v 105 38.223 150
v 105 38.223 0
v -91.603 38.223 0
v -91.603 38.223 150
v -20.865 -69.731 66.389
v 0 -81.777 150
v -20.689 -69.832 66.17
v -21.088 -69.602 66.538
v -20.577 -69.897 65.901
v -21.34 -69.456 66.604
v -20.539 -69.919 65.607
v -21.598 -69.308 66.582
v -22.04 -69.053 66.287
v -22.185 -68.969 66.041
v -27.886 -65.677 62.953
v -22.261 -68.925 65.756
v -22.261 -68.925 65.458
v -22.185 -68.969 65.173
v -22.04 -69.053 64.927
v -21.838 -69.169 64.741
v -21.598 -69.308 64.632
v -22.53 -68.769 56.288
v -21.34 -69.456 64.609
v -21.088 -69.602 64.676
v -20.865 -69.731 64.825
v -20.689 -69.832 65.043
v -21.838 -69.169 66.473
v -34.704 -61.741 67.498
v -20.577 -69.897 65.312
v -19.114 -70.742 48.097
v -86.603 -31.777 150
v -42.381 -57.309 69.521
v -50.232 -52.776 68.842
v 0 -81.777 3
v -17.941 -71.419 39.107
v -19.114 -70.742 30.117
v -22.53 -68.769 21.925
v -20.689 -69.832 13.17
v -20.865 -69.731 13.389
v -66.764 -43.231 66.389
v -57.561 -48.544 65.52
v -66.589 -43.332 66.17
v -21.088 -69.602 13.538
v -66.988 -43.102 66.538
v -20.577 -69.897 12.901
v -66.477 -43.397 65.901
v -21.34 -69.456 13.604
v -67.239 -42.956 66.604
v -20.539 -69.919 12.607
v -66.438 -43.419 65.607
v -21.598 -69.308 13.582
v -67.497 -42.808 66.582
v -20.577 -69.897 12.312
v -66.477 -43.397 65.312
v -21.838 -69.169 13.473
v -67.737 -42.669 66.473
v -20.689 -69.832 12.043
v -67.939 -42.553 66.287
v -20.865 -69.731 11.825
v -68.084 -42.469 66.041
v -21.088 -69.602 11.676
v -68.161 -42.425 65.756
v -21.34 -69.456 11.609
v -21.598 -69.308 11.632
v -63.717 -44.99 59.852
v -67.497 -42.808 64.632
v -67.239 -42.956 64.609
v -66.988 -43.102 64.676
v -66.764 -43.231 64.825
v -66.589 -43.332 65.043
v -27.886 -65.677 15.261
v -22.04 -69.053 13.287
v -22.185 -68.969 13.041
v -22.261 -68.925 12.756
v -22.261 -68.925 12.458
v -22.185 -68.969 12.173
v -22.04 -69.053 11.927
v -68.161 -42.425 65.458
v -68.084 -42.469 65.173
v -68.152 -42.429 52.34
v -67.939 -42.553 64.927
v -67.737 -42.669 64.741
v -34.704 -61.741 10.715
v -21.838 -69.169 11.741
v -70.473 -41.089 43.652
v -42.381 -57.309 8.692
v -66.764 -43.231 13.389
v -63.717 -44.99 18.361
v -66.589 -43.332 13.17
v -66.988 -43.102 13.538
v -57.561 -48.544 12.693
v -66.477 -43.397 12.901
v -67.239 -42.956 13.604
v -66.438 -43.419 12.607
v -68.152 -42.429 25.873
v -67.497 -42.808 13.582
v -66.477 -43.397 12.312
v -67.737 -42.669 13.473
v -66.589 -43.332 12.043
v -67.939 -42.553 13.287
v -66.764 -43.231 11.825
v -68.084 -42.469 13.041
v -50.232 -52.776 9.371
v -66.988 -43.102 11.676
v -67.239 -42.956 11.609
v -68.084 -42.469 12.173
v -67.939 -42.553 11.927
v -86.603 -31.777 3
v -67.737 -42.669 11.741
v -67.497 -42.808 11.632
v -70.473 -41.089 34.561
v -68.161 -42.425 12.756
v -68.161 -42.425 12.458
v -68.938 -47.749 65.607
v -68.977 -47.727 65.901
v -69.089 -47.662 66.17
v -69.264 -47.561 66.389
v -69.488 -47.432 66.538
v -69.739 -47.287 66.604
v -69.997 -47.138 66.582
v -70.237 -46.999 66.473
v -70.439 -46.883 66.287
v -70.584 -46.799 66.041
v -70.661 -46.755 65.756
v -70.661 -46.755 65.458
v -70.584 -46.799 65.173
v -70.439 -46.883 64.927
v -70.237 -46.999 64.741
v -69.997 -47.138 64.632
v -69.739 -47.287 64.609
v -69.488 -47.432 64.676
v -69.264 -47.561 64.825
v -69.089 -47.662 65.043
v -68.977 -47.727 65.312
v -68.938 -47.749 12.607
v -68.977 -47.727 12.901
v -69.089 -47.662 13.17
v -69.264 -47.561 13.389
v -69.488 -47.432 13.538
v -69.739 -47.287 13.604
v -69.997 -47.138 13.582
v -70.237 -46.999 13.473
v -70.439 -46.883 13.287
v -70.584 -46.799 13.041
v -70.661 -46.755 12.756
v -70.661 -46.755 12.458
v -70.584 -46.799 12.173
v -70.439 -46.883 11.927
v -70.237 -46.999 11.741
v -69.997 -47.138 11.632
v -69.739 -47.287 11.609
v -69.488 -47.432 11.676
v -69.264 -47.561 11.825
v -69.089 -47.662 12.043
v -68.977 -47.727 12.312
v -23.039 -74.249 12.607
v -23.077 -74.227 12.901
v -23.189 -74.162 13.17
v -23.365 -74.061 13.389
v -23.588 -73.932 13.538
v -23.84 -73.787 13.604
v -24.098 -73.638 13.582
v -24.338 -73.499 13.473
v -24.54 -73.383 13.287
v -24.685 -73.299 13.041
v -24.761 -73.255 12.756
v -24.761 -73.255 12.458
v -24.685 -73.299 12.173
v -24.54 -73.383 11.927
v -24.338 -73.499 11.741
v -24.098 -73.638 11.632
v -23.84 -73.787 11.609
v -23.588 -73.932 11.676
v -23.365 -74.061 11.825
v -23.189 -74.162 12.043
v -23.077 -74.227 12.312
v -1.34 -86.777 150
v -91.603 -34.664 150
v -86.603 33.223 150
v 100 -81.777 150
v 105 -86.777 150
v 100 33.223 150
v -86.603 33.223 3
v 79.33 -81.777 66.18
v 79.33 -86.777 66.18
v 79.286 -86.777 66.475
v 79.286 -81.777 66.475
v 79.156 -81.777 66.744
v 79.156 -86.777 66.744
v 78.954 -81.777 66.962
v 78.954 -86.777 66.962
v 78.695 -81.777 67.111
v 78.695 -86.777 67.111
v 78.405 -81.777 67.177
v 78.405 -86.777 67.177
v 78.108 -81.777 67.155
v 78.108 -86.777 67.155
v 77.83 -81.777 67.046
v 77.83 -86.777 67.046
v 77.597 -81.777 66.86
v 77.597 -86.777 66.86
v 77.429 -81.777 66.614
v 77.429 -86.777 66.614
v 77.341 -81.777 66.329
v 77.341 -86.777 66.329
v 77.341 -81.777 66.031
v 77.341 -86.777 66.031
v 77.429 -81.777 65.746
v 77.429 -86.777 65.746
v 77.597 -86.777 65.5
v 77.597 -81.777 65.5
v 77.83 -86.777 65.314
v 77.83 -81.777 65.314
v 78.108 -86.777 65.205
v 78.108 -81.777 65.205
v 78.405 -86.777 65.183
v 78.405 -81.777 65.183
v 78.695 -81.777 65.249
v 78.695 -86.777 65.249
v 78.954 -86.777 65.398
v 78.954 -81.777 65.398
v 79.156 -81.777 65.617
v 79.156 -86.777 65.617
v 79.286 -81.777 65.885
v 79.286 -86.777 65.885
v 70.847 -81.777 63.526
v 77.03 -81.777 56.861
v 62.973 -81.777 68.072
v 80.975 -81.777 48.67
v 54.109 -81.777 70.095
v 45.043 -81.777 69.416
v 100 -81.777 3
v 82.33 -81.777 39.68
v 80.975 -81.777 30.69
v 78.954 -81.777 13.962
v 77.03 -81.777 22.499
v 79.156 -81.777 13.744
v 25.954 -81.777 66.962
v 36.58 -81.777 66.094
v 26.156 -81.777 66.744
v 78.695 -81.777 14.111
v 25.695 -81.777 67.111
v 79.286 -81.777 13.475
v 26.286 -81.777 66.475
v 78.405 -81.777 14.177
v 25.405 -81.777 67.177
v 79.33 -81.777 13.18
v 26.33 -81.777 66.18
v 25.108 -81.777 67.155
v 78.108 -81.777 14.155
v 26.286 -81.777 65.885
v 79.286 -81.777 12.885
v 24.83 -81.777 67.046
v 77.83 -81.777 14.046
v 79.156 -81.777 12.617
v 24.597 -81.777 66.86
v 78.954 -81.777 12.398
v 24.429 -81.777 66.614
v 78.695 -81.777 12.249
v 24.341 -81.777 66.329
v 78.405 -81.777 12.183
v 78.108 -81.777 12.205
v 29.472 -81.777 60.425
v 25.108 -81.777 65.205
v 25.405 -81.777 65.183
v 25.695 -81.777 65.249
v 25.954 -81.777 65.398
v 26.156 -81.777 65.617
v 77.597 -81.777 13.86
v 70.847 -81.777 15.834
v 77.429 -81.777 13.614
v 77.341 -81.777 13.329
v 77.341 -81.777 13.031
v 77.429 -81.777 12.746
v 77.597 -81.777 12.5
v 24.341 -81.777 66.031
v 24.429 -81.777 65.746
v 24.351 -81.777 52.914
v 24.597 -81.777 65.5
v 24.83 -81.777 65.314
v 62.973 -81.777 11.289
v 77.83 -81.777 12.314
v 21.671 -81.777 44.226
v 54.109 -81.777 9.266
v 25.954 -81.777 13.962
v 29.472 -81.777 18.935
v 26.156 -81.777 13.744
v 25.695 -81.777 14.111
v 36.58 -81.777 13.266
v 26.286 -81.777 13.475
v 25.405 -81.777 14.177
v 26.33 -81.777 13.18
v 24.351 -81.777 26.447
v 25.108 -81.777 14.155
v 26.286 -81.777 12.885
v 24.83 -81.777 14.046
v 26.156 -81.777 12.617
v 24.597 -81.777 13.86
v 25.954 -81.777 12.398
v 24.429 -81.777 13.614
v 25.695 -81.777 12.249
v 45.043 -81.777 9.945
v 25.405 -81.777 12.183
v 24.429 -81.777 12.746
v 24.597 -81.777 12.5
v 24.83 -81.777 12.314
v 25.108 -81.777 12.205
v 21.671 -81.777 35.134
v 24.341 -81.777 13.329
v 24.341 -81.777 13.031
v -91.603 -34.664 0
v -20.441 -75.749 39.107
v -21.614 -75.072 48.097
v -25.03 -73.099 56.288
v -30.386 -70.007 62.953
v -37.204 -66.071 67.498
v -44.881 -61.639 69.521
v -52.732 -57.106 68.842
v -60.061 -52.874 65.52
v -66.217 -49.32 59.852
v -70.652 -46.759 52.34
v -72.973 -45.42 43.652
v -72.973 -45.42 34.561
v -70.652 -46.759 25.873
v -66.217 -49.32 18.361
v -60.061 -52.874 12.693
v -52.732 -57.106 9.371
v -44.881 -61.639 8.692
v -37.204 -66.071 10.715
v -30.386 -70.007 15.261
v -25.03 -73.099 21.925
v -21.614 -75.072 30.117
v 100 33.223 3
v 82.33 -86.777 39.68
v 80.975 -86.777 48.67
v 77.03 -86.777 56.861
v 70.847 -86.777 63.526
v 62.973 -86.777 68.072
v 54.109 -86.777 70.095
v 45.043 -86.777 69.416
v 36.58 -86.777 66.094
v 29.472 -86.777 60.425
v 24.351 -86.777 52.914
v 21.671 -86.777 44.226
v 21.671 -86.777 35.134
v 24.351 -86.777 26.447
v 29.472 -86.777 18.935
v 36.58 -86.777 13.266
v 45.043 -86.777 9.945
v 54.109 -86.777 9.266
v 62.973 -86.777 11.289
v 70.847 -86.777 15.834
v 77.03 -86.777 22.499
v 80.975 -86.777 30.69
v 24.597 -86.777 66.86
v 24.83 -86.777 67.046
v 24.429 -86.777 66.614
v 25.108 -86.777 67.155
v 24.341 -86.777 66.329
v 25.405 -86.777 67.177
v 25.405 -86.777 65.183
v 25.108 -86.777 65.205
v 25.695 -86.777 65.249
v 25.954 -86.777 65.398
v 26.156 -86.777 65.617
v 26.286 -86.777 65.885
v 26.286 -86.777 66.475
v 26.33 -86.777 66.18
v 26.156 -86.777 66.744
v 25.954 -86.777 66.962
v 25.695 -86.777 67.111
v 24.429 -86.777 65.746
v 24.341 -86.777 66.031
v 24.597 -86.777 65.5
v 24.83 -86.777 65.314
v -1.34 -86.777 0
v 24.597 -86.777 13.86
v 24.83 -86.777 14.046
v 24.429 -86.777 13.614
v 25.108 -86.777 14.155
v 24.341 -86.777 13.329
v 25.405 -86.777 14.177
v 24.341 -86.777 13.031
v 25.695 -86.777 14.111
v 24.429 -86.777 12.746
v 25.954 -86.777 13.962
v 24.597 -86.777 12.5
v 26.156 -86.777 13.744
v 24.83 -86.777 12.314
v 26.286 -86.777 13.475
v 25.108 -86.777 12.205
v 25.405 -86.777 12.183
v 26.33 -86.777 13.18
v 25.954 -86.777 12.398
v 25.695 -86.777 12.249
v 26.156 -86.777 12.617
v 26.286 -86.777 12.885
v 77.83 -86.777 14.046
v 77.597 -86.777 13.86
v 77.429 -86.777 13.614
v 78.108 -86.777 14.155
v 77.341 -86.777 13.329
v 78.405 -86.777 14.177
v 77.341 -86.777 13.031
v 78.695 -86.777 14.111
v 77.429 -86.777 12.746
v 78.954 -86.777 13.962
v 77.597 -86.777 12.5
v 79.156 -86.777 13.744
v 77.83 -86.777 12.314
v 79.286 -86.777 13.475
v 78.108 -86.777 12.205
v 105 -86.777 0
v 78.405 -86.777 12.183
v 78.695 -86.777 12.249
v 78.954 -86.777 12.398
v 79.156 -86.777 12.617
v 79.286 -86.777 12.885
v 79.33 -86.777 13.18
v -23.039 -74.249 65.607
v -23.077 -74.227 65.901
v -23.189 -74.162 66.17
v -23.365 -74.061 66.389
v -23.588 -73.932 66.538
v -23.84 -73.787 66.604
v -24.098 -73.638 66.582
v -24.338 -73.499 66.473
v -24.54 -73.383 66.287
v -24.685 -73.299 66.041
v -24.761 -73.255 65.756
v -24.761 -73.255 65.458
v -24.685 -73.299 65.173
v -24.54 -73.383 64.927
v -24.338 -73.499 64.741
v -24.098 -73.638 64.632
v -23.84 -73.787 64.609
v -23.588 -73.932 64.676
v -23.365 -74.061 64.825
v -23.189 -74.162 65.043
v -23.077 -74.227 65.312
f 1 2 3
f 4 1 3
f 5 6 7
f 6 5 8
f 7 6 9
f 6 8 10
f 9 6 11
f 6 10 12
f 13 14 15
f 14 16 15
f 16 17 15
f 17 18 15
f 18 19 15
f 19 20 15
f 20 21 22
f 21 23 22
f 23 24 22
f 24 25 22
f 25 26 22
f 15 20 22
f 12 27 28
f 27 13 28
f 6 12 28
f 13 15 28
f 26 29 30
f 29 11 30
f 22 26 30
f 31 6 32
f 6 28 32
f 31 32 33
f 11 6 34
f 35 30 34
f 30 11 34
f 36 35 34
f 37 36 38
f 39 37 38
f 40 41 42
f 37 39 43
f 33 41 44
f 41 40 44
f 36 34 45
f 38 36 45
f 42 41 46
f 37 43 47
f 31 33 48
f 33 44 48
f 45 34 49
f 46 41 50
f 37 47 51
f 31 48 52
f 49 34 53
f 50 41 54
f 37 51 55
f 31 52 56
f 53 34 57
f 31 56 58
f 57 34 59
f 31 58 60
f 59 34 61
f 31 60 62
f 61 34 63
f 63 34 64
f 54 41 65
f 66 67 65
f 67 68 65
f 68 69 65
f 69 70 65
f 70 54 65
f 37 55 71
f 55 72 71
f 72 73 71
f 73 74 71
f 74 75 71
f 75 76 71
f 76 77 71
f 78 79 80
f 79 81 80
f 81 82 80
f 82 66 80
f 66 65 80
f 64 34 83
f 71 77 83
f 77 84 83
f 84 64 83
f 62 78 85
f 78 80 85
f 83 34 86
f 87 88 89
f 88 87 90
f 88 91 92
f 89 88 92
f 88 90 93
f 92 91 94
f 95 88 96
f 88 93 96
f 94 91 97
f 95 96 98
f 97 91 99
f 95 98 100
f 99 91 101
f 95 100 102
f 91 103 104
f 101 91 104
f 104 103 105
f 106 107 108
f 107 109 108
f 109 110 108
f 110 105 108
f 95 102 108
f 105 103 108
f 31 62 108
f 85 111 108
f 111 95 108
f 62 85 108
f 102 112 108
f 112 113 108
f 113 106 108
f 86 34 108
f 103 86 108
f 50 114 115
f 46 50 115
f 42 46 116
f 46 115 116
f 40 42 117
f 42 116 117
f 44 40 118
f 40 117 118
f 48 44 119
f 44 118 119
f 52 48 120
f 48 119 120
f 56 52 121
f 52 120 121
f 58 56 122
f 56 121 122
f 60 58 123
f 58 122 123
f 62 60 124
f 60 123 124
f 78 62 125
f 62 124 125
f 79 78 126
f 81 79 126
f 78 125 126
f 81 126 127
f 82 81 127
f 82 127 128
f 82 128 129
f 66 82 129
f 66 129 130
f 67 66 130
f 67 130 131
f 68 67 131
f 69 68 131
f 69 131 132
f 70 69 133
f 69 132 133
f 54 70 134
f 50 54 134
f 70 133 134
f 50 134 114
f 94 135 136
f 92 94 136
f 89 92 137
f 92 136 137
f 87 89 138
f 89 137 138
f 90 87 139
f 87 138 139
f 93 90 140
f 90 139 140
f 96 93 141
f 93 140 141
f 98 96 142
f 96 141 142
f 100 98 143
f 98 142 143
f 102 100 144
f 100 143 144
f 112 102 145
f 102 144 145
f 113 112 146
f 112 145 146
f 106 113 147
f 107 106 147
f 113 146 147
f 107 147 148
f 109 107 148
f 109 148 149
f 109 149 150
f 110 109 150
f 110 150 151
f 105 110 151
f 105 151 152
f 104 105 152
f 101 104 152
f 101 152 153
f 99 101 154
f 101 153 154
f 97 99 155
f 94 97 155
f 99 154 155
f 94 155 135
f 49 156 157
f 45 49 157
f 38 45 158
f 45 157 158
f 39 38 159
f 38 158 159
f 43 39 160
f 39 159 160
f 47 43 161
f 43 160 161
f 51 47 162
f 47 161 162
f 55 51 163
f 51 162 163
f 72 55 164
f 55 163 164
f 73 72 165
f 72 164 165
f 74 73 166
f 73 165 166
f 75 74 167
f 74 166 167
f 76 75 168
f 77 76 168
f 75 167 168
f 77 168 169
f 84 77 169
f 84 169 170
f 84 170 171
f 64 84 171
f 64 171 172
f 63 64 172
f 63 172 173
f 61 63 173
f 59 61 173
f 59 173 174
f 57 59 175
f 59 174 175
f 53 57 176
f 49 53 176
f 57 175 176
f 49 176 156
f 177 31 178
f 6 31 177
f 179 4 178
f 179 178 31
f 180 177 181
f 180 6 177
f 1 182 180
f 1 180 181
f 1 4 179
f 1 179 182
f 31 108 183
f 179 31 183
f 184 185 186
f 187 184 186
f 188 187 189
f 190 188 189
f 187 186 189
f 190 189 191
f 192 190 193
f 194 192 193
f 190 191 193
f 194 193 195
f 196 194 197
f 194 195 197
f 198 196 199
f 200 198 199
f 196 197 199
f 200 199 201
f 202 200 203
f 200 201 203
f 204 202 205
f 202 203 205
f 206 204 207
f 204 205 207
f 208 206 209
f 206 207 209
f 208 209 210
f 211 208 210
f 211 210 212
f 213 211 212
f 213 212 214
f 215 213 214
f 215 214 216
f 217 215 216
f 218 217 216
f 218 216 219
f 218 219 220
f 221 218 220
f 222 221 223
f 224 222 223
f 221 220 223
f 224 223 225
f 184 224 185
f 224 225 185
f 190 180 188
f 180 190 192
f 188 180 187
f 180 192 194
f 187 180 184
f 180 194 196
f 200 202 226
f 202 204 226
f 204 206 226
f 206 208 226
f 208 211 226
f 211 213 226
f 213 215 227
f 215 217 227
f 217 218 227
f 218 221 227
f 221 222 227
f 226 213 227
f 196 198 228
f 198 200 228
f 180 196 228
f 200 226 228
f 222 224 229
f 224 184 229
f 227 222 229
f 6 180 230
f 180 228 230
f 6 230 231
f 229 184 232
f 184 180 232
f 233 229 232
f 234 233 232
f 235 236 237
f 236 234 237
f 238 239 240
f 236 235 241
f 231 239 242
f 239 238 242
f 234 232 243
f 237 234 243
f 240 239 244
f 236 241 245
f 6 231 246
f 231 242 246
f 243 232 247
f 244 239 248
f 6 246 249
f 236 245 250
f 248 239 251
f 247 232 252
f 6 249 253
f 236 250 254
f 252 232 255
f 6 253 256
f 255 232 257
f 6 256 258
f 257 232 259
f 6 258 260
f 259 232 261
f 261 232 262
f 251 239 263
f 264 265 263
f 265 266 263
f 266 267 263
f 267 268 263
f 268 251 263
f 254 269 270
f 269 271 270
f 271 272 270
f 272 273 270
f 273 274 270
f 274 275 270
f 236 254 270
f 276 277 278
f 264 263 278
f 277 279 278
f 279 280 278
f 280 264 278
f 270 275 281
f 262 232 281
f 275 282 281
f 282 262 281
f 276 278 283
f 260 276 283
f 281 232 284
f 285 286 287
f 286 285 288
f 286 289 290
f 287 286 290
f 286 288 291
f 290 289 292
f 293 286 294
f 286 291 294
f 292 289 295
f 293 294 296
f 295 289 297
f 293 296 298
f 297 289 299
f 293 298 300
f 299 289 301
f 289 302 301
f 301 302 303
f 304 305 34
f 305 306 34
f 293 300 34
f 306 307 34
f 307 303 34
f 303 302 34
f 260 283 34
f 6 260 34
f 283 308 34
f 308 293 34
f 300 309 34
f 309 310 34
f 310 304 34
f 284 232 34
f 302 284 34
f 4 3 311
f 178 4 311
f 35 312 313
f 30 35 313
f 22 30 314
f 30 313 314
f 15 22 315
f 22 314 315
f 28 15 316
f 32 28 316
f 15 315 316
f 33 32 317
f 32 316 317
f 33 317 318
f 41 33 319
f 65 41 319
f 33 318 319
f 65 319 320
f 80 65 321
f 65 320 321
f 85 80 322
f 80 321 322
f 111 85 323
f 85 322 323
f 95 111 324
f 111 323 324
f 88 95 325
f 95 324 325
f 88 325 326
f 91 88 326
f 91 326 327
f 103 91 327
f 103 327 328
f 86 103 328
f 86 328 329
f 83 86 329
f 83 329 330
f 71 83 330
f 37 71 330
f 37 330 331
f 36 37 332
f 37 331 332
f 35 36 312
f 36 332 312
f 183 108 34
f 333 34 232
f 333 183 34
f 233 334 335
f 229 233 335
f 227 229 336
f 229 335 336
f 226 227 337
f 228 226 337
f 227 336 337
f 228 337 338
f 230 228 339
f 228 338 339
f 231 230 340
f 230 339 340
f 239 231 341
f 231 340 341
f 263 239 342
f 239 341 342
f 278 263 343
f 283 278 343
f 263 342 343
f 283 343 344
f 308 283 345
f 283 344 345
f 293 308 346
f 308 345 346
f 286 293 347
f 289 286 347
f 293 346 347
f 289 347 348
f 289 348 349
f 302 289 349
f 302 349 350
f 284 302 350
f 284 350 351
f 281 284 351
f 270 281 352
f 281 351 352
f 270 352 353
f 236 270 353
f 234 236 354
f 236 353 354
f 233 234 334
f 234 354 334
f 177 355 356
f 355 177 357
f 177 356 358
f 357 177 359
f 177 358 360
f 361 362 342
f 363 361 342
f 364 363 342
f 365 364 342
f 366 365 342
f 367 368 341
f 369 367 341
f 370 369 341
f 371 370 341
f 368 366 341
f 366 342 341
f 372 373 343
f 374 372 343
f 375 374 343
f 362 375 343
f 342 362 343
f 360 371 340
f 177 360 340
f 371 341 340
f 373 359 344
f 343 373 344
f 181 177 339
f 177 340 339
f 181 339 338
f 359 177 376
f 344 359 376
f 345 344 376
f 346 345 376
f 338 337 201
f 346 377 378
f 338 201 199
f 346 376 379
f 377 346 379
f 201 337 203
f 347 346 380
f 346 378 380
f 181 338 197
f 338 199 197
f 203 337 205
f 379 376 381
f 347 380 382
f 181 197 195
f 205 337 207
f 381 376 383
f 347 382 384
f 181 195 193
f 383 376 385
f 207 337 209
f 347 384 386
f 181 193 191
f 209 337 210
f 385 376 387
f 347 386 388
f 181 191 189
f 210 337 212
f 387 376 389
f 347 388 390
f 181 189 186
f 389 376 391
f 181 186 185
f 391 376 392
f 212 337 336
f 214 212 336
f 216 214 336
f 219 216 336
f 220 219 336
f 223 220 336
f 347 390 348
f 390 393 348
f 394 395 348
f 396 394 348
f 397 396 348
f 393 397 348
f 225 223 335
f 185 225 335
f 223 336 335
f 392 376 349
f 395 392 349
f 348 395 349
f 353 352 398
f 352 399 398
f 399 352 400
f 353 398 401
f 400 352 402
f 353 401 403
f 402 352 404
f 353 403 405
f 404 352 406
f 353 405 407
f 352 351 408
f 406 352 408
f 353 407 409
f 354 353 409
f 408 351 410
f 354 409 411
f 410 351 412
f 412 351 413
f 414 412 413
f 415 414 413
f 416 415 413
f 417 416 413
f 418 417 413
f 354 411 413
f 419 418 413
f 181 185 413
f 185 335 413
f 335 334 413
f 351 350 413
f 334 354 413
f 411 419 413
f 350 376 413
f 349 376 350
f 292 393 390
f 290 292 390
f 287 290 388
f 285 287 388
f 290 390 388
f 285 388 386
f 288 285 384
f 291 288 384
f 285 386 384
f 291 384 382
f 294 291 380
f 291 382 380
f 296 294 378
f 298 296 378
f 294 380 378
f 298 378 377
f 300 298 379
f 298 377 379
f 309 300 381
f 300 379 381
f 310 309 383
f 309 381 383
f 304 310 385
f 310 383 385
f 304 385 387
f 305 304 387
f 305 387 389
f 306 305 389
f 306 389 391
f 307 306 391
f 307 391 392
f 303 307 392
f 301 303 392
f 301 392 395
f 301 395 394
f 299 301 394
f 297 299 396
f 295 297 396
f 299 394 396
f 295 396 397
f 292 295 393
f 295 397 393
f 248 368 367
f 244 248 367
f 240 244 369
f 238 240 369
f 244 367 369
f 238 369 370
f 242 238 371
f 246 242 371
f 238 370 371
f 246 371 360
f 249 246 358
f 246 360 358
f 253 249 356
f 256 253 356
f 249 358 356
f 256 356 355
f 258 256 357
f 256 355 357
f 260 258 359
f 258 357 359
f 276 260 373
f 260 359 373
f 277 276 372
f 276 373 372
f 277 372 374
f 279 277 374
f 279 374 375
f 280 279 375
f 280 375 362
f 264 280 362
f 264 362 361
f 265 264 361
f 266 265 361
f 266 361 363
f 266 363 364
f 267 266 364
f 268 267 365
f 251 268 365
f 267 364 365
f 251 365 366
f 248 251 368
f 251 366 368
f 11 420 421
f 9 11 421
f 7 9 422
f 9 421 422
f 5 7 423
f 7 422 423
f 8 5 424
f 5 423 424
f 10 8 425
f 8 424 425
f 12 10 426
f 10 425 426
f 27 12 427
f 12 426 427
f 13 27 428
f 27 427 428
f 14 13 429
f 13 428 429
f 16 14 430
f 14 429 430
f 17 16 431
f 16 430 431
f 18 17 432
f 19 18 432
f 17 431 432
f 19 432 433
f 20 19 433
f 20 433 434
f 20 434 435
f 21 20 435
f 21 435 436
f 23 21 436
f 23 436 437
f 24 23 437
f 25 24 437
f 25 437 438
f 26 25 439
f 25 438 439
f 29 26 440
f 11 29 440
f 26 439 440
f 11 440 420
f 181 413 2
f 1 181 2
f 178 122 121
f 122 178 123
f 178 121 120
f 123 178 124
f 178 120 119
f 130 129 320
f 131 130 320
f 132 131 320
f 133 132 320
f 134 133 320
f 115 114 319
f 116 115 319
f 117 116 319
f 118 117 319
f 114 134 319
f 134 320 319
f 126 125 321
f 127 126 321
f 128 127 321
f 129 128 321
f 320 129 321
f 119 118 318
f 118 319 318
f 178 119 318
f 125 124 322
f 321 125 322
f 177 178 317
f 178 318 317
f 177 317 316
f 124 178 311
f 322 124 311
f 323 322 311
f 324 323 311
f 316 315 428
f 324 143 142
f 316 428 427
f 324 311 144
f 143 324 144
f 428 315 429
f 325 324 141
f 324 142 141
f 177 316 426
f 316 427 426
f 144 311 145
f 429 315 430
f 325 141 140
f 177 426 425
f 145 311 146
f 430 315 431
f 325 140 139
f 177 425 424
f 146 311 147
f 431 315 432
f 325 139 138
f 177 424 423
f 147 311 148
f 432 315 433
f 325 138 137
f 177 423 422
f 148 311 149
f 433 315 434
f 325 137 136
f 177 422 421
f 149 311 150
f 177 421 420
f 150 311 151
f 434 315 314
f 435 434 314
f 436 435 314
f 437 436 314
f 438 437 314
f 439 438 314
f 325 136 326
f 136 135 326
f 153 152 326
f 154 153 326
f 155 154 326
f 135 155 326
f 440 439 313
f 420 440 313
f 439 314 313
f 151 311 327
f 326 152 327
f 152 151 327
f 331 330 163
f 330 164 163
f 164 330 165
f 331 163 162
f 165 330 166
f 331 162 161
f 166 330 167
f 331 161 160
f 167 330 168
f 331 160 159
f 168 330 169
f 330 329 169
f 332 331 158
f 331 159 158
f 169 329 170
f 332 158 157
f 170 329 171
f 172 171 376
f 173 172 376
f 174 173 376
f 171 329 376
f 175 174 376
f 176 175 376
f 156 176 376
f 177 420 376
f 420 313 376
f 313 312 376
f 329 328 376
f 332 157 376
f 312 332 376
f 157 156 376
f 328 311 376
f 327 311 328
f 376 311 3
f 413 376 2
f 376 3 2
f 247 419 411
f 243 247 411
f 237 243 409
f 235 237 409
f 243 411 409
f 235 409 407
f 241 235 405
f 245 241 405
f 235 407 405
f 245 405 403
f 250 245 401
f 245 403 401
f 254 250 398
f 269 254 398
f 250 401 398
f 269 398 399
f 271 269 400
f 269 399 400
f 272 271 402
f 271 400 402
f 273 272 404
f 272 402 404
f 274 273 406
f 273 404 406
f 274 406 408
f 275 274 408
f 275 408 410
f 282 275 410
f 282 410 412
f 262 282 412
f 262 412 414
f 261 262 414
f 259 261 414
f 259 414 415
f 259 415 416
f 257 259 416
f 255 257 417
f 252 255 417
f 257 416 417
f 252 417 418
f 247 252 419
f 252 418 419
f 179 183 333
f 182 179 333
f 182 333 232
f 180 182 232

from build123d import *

# Parameters (mm, degrees)
F1_DEPTH = 3
F2_DEPTH = 150
F3_R     = 30.5
F3_R_2   = 1
F4_DEPTH = 5
F5_R     = 30.5
F5_R_2   = 1
F6_DEPTH = 5


with BuildPart() as f1:
    # F0 (on Top) → F1 (new body)
    with BuildSketch(Plane.XY):
        Polygon((-91.6025403784, 38.2228657698), (-91.6025403784, -34.6638855762), (-1.3397459622, -86.7771342302), (105, -86.7771342302), (105, 38.2228657698), align=None)
        Polygon((100, -81.7771342302), (0, -81.7771342302), (-86.6025403784, -31.7771342302), (-86.6025403784, 33.2228657698), (100, 33.2228657698), align=None, mode=Mode.SUBTRACT)
        Polygon((-86.6025403784, -31.7771342302), (0, -81.7771342302), (100, -81.7771342302), (100, 33.2228657698), (-86.6025403784, 33.2228657698), align=None)
    extrude(amount=F1_DEPTH)

    # F0 (on Top) → F2 (join)
    with BuildSketch(Plane.XY):
        Polygon((-91.6025403784, 38.2228657698), (-91.6025403784, -34.6638855762), (-1.3397459622, -86.7771342302), (105, -86.7771342302), (105, 38.2228657698), align=None)
        Polygon((100, -81.7771342302), (0, -81.7771342302), (-86.6025403784, -31.7771342302), (-86.6025403784, 33.2228657698), (100, 33.2228657698), align=None, mode=Mode.SUBTRACT)
    extrude(amount=F2_DEPTH)

    # F3 (on face) → F4 (cut)
    with BuildSketch(Plane.XZ.offset(86.7771342302)):
        with Locations((51.8301270189, 39.6802276373)):
            Circle(F3_R)
        with Locations((25.3301270189, 13.1802276373)):
            Circle(F3_R_2)
        with Locations((78.3301270189, 13.1802276373)):
            Circle(F3_R_2)
        with Locations((78.3301270189, 66.1802276373)):
            Circle(F3_R_2)
        with Locations((25.3301270189, 66.1802276373)):
            Circle(F3_R_2)
    extrude(amount=-F4_DEPTH, mode=Mode.SUBTRACT)

    # F5 (on face) → F6 (cut)
    with BuildSketch(Plane(origin=(-37.910537846, -65.6629776916, 0), x_dir=(0.8660254038, -0.5, 0), z_dir=(-0.5, -0.8660254038, 0))):
        with Locations((-10.3275869042, 39.1066893935)):
            Circle(F5_R)
        with Locations((16.1724130958, 65.6066893935)):
            Circle(F5_R_2)
        with Locations((16.1724130958, 12.6066893935)):
            Circle(F5_R_2)
        with Locations((-36.8275869042, 65.6066893935)):
            Circle(F5_R_2)
        with Locations((-36.8275869042, 12.6066893935)):
            Circle(F5_R_2)
    extrude(amount=-F6_DEPTH, mode=Mode.SUBTRACT)


solid = f1.part
